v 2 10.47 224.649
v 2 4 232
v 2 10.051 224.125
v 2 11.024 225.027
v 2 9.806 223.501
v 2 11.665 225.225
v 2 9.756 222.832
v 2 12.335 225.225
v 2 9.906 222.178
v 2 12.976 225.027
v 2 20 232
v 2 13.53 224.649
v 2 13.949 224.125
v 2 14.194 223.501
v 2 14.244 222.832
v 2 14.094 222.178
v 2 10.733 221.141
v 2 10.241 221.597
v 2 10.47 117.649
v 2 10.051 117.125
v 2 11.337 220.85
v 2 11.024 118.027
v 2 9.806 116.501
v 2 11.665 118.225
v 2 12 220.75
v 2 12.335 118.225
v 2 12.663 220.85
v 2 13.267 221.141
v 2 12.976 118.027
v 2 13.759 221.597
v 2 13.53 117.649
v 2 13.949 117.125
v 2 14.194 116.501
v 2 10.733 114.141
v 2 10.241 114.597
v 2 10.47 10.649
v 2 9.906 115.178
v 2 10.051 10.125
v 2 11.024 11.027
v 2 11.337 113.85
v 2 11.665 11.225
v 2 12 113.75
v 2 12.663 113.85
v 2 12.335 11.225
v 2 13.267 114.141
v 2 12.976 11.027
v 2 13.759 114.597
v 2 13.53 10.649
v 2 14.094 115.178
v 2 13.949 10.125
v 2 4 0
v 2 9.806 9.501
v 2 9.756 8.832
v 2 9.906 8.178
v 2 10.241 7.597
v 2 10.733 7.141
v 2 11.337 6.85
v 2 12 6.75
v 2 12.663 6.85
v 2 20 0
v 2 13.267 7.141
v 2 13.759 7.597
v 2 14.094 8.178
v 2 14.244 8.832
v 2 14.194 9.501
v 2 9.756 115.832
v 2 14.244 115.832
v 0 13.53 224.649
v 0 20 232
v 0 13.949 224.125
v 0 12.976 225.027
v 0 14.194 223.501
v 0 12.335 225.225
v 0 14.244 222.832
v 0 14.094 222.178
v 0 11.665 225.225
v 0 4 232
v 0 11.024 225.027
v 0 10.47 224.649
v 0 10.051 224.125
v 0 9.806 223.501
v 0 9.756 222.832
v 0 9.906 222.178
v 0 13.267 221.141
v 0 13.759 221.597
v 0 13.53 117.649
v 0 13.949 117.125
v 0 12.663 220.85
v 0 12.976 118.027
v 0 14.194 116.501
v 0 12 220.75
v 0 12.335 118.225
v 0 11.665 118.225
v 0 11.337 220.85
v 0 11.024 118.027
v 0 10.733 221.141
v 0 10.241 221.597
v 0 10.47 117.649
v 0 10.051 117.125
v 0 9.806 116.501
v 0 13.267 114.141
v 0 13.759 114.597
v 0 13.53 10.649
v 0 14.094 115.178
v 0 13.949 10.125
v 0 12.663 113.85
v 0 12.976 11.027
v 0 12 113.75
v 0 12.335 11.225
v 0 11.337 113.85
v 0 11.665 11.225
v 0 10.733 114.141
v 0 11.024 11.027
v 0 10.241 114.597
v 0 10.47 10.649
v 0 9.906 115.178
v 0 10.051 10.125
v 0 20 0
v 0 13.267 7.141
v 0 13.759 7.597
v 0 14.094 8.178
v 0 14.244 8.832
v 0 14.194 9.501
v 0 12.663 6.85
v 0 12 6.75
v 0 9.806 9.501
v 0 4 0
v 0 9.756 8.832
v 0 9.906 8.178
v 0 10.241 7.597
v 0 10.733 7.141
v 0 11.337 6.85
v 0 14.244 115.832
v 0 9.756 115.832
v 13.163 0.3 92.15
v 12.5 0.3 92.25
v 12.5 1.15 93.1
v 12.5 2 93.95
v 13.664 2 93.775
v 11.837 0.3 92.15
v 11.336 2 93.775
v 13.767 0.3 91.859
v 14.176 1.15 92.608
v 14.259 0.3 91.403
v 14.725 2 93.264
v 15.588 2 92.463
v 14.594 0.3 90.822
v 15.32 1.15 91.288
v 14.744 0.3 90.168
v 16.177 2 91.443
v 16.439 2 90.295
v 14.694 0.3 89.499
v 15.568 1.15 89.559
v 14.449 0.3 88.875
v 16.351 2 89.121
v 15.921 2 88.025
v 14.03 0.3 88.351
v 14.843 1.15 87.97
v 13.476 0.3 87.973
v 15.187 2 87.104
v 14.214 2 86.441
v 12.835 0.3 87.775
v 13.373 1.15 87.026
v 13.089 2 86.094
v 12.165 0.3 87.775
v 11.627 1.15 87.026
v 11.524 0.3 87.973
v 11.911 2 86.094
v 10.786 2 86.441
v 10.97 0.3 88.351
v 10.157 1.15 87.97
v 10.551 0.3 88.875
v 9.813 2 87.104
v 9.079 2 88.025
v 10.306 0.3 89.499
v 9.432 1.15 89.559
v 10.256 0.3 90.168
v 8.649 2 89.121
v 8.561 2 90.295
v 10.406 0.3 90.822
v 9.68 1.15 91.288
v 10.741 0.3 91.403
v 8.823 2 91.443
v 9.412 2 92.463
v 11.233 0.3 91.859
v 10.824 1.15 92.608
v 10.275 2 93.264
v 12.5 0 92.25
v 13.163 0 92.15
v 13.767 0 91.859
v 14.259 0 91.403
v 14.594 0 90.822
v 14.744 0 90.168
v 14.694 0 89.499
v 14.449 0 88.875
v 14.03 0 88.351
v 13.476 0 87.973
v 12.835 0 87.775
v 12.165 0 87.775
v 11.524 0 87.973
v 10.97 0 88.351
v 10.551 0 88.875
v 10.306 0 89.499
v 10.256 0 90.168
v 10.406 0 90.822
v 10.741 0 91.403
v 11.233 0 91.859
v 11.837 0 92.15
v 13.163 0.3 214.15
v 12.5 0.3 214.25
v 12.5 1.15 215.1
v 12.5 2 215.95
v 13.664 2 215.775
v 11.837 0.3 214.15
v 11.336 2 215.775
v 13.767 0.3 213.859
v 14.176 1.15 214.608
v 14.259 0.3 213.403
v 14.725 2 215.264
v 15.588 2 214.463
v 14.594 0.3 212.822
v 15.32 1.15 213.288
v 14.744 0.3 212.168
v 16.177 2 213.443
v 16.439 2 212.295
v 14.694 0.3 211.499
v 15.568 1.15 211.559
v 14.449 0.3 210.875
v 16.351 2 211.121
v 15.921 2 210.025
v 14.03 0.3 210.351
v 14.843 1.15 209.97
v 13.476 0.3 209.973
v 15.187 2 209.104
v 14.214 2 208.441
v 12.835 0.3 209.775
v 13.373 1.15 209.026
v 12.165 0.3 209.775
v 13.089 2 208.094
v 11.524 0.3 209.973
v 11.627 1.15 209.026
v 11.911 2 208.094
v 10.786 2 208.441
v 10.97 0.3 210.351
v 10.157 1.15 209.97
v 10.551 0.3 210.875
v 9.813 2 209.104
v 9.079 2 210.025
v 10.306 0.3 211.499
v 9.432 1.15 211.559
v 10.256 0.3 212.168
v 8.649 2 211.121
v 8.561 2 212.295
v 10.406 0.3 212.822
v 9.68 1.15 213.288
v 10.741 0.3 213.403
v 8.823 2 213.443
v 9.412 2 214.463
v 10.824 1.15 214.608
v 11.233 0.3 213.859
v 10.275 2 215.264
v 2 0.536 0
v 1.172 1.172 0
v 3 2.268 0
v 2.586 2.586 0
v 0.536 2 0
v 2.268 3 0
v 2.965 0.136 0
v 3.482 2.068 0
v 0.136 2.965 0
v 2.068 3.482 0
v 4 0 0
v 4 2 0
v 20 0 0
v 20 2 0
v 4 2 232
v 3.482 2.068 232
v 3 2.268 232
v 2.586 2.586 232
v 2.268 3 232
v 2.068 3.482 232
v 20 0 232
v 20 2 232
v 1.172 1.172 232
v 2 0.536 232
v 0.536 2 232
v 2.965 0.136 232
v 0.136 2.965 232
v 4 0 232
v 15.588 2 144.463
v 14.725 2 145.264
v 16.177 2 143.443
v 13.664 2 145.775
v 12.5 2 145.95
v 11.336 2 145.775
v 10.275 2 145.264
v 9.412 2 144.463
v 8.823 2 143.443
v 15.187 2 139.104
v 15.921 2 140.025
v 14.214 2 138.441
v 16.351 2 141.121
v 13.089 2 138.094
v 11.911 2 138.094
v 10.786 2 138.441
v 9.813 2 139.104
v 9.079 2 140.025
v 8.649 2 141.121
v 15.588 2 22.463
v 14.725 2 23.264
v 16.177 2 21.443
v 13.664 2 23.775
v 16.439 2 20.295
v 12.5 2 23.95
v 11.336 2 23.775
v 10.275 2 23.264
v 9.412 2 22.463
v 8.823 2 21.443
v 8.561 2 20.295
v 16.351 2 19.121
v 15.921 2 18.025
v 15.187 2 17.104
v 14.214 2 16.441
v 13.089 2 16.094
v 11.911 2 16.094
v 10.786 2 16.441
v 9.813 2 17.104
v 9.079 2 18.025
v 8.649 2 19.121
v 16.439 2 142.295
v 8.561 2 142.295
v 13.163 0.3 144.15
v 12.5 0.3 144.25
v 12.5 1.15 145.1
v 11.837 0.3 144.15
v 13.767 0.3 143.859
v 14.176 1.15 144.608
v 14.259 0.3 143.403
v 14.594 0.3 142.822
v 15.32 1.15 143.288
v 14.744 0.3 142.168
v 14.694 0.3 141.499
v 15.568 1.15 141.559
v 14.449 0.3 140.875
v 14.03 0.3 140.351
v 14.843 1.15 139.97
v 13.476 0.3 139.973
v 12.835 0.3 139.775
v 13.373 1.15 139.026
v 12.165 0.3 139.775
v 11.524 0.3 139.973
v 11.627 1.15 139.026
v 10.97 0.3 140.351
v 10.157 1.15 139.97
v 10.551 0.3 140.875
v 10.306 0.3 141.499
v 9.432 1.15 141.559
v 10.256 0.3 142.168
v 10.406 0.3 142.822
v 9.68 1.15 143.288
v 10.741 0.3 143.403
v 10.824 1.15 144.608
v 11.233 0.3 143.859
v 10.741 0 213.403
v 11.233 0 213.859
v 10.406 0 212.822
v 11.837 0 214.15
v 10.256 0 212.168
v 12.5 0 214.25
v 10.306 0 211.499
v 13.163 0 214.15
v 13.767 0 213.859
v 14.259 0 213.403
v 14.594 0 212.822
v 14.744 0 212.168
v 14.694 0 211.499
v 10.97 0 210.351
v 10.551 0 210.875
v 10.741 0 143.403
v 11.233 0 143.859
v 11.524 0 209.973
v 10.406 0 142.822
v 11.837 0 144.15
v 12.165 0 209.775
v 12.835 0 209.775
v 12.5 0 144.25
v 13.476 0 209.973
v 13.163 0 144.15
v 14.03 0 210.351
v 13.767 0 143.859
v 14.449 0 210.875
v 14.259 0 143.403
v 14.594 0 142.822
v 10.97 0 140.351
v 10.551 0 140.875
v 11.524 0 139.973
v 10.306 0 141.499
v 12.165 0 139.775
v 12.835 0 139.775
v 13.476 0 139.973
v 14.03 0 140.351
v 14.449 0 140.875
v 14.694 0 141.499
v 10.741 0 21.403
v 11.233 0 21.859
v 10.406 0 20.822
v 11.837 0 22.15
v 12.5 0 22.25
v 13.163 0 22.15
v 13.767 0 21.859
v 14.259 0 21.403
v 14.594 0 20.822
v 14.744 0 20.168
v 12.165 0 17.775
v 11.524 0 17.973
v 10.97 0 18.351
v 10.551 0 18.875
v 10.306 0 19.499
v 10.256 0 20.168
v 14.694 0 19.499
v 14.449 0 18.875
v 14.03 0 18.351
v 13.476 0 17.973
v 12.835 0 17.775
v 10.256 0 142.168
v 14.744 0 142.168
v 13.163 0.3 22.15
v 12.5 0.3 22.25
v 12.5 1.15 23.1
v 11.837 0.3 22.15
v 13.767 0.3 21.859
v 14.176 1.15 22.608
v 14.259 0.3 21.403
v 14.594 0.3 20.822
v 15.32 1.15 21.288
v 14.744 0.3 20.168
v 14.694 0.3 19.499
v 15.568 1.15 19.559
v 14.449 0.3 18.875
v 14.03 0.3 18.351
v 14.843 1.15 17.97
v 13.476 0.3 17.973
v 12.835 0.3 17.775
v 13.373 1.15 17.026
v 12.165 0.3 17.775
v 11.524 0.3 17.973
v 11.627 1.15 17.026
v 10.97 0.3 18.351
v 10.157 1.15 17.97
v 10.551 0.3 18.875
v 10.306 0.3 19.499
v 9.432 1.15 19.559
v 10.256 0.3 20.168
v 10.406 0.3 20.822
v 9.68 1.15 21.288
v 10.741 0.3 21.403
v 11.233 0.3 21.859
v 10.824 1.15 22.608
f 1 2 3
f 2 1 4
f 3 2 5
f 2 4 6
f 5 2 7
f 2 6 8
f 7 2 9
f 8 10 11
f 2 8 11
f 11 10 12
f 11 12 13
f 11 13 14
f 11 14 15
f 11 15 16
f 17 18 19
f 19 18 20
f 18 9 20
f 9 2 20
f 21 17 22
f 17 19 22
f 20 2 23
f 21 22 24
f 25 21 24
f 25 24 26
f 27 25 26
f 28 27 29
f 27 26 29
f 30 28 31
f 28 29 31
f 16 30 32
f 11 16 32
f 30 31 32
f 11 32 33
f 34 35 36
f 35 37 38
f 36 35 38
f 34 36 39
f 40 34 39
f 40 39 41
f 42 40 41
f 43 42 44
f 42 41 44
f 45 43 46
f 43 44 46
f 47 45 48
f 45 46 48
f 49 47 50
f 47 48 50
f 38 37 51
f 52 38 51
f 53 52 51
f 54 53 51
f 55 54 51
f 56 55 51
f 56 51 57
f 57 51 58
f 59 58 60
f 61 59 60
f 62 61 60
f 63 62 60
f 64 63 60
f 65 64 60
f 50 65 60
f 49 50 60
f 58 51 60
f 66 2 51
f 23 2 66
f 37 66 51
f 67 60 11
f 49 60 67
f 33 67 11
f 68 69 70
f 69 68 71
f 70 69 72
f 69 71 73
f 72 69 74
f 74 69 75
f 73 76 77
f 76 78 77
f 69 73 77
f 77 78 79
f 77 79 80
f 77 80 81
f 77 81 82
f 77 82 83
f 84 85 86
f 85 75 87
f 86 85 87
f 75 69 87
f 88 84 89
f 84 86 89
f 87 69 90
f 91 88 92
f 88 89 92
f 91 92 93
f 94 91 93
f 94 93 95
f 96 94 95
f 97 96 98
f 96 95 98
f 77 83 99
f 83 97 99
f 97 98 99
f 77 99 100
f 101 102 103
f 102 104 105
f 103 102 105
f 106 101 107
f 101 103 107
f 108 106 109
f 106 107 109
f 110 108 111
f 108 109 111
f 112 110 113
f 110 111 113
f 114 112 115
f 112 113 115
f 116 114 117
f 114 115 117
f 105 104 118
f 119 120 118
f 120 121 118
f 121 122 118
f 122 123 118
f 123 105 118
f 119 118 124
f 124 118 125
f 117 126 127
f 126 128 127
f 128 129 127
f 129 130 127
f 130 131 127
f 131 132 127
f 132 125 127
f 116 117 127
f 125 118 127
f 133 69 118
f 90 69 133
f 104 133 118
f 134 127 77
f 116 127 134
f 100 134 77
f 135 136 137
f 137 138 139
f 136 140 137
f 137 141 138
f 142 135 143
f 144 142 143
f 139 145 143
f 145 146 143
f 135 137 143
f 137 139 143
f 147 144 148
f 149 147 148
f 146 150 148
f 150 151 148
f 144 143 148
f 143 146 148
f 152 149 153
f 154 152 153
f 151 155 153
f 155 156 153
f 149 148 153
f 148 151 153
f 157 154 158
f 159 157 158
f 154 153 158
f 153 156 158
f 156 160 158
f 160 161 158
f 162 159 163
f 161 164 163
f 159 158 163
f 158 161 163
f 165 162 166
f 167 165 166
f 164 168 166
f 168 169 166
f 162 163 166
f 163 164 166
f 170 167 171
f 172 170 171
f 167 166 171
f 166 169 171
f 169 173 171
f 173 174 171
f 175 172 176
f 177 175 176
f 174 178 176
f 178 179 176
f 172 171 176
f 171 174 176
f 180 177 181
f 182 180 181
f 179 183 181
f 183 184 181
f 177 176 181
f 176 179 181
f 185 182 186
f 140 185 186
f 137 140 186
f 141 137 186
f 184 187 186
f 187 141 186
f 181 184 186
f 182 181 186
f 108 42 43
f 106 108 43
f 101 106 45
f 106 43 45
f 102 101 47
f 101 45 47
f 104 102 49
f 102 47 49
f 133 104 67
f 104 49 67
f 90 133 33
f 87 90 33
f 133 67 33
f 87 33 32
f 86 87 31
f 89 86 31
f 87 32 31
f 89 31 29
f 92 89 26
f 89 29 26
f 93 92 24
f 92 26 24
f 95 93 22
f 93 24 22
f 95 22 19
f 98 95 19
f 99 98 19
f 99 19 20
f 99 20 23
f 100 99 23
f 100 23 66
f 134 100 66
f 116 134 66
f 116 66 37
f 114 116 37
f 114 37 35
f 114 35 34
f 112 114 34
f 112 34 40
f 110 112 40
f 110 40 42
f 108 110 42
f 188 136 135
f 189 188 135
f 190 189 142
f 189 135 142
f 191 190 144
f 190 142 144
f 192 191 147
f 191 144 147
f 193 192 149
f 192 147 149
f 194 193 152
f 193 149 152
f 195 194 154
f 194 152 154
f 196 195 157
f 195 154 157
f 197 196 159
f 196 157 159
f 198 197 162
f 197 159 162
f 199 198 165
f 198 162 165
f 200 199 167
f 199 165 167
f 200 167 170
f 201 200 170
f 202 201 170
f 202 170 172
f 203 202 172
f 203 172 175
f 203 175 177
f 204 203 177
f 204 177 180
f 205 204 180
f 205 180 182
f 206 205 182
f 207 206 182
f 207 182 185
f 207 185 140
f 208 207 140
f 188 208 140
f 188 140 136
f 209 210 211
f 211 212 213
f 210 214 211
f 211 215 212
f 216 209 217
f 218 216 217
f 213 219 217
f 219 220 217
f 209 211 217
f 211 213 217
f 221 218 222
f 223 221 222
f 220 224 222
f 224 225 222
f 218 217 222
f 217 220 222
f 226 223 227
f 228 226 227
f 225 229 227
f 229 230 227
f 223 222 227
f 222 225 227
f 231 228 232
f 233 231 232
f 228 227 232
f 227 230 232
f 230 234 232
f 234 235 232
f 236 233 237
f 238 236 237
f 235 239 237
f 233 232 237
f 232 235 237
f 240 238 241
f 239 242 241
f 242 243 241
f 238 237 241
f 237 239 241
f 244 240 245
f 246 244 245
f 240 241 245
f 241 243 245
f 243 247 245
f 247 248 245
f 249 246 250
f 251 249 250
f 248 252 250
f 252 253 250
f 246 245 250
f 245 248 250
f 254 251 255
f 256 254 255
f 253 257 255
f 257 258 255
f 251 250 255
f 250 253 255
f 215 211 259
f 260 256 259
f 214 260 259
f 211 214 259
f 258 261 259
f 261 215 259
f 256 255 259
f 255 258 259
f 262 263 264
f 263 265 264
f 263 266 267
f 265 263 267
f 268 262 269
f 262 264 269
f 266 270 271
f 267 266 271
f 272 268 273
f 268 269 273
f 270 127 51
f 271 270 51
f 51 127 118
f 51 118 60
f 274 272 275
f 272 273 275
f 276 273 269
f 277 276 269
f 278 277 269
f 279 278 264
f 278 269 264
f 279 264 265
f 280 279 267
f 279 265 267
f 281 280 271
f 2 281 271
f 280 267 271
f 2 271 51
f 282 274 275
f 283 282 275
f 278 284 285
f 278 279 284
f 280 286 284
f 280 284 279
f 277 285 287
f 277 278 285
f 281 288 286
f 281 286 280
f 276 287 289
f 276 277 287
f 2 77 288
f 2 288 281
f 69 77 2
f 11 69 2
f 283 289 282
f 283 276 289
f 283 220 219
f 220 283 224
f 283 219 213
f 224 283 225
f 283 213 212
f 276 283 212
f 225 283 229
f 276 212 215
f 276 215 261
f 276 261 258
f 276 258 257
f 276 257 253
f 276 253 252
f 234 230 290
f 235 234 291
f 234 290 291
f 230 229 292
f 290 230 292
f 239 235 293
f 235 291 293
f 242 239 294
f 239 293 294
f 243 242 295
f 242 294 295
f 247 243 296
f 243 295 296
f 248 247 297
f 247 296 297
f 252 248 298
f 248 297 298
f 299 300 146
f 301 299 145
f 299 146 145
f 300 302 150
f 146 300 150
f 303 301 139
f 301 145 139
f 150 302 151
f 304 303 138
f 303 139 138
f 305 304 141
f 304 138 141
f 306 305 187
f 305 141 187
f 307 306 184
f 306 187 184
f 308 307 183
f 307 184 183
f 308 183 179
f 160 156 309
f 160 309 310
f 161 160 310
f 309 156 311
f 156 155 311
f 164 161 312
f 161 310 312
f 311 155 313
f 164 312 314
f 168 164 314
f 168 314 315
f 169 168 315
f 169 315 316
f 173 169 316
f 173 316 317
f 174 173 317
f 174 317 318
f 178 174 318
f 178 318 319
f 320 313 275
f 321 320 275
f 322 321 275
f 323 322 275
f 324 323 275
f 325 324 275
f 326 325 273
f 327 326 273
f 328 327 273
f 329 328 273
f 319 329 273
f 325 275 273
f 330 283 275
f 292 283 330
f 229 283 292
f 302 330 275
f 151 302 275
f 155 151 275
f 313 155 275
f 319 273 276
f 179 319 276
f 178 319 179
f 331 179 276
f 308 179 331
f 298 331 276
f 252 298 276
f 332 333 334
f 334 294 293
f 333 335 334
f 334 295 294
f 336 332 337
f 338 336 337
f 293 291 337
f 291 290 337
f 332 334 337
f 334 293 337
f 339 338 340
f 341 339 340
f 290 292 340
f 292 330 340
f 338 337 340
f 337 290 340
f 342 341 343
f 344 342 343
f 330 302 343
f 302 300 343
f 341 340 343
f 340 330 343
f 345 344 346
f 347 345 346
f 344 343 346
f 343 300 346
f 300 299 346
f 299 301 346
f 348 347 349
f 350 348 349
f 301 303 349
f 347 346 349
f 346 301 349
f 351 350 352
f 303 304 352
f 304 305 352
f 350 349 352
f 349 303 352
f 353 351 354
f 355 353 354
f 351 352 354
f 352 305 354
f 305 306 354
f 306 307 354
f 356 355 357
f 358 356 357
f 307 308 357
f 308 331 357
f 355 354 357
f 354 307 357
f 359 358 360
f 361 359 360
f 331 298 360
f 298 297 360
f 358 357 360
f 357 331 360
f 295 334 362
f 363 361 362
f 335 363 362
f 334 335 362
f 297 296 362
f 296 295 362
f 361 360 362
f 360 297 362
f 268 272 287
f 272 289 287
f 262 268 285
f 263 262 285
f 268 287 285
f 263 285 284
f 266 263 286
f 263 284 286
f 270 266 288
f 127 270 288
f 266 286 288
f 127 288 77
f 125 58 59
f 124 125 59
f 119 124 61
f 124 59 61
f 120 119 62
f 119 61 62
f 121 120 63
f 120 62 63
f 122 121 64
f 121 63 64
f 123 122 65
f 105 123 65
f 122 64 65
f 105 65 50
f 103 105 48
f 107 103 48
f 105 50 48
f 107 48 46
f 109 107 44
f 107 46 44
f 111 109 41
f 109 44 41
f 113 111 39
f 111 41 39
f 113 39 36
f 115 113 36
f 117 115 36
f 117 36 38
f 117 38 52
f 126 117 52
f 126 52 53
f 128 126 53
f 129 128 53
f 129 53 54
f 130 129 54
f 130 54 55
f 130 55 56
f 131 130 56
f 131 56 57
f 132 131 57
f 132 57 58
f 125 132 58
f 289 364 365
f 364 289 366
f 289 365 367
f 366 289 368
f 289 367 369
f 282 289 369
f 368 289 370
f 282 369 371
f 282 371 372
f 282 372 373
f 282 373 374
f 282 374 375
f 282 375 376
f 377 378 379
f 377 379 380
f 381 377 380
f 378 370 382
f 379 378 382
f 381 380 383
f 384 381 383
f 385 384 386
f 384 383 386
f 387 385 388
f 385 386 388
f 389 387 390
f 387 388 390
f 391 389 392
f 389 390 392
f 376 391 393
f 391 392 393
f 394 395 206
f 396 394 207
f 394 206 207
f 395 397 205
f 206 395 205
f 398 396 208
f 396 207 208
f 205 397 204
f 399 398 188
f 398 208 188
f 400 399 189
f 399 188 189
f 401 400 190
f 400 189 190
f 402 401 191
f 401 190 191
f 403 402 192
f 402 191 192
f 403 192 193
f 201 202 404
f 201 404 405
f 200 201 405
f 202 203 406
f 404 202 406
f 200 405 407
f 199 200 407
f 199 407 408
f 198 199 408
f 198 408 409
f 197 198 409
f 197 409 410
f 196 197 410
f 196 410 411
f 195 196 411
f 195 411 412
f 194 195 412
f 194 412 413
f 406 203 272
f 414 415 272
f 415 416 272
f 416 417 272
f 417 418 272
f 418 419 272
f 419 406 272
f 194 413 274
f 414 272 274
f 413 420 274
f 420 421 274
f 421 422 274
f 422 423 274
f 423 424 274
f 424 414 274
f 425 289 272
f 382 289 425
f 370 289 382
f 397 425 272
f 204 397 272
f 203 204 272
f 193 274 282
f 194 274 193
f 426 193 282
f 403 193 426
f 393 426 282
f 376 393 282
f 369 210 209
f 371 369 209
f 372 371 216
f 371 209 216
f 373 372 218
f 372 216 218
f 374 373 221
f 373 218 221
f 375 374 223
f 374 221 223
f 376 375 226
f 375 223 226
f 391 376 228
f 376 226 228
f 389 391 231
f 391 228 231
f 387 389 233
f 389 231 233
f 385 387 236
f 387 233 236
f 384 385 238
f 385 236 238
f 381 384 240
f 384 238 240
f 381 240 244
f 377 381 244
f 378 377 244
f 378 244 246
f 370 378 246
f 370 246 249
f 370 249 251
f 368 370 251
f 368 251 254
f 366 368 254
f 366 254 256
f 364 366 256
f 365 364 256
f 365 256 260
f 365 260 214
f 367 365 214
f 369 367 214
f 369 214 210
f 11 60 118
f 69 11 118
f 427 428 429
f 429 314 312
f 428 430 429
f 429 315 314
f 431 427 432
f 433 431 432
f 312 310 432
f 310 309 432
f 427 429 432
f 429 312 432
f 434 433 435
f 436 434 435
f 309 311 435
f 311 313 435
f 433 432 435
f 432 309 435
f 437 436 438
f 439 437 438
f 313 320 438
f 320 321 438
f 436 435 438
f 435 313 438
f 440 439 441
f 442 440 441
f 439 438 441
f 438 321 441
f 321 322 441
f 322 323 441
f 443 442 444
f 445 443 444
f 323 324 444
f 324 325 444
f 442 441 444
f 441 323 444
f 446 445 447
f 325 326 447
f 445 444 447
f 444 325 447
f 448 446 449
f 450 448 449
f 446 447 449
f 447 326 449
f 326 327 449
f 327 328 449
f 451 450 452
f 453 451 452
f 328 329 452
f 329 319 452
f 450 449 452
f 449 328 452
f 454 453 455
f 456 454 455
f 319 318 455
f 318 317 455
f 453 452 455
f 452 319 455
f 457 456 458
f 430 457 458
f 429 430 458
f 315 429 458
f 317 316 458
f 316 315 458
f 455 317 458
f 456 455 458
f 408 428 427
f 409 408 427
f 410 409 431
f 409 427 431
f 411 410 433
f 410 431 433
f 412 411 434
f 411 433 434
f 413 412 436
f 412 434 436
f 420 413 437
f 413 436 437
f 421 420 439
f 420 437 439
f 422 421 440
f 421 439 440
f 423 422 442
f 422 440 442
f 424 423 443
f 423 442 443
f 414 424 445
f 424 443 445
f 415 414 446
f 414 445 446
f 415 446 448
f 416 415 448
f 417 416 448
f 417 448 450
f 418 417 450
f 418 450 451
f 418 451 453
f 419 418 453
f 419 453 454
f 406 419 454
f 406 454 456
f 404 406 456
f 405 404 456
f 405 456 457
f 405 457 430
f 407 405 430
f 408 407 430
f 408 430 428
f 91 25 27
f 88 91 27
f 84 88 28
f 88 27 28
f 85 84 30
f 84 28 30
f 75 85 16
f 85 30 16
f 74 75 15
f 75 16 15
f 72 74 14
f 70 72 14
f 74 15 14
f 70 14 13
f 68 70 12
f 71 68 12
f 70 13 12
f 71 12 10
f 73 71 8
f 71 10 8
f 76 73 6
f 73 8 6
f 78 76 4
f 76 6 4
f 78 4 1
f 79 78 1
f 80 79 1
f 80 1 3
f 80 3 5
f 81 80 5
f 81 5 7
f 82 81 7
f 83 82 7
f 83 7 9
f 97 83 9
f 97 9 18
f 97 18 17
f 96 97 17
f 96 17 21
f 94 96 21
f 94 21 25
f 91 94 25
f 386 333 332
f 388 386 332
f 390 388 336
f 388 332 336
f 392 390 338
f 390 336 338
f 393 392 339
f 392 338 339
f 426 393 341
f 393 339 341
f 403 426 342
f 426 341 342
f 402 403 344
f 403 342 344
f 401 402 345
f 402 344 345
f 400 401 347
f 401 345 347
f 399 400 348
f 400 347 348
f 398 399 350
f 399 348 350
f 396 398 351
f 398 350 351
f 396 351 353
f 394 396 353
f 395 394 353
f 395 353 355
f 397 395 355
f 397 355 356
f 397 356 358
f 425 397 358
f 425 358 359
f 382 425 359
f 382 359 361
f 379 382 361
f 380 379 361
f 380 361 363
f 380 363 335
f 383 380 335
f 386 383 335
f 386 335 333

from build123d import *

# Parameters (mm, degrees)
EXTRUDE_1_DEPTH     = 232
SKETCH_2_R          = 2.25
CUT_EXTRUDE_1_DEPTH = 10
SKETCH_3_R          = 2.25
CUT_EXTRUDE_2_DEPTH = 10
CHAMFER_1_SIZE      = 1.7
FILLET_1_R          = 4


with BuildPart() as part:
    # Эскиз1 → Вытянуть1 (new body)
    with BuildSketch(Plane.XY):
        with BuildLine():
            Line((0, 0), (20, 0))
            Line((20, 0), (20, 2))
            Line((20, 2), (4, 2))
            ThreePointArc((4, 2), (2.585786438, 2.585786438), (2, 4))
            Line((2, 4), (2, 20))
            Line((2, 20), (0, 20))
            Line((0, 20), (0, 0))
        make_face()
    extrude(amount=EXTRUDE_1_DEPTH)

    # Эскиз2 → Вырез-Вытянуть1 (cut)
    with BuildSketch(Plane(origin=(2, 0, 0), x_dir=(0, 0, -1), z_dir=(1, 0, 0))):
        with Locations((-223, 12)):
            Circle(SKETCH_2_R)
        with Locations((-9, 12)):
            Circle(SKETCH_2_R)
        with Locations((-116, 12)):
            Circle(SKETCH_2_R)
    extrude(amount=-CUT_EXTRUDE_1_DEPTH, mode=Mode.SUBTRACT)

    # Эскиз3 → Вырез-Вытянуть2 (cut)
    with BuildSketch(Plane(origin=(0, 2, 0), x_dir=(1, 0, 0), z_dir=(0, 1, 0))):
        with Locations(Location((12.5, -212, 0), (0, 0, 270))):
            Circle(SKETCH_3_R)
        with Locations(Location((12.5, -142, 0), (0, 0, 270))):
            Circle(SKETCH_3_R)
        with Locations(Location((12.5, -20, 0), (0, 0, 270))):
            Circle(SKETCH_3_R)
        with Locations(Location((12.5, -90, 0), (0, 0, 270))):
            Circle(SKETCH_3_R)
    extrude(amount=-CUT_EXTRUDE_2_DEPTH, mode=Mode.SUBTRACT)

    # Фаска1
    chamfer_1_edges = [part.edges().sort_by_distance(p)[0] for p in [
        (12.5, 2, 209.75),
        (12.5, 2, 139.75),
        (12.5, 2, 17.75),
        (12.5, 2, 87.75),
    ]]
    chamfer(chamfer_1_edges, length=CHAMFER_1_SIZE)

    # Скругление1
    fillet_1_edges = [part.edges().sort_by_distance(p)[0] for p in [
        (0, 0, 116),
    ]]
    fillet(fillet_1_edges, radius=FILLET_1_R)


solid = part.part
